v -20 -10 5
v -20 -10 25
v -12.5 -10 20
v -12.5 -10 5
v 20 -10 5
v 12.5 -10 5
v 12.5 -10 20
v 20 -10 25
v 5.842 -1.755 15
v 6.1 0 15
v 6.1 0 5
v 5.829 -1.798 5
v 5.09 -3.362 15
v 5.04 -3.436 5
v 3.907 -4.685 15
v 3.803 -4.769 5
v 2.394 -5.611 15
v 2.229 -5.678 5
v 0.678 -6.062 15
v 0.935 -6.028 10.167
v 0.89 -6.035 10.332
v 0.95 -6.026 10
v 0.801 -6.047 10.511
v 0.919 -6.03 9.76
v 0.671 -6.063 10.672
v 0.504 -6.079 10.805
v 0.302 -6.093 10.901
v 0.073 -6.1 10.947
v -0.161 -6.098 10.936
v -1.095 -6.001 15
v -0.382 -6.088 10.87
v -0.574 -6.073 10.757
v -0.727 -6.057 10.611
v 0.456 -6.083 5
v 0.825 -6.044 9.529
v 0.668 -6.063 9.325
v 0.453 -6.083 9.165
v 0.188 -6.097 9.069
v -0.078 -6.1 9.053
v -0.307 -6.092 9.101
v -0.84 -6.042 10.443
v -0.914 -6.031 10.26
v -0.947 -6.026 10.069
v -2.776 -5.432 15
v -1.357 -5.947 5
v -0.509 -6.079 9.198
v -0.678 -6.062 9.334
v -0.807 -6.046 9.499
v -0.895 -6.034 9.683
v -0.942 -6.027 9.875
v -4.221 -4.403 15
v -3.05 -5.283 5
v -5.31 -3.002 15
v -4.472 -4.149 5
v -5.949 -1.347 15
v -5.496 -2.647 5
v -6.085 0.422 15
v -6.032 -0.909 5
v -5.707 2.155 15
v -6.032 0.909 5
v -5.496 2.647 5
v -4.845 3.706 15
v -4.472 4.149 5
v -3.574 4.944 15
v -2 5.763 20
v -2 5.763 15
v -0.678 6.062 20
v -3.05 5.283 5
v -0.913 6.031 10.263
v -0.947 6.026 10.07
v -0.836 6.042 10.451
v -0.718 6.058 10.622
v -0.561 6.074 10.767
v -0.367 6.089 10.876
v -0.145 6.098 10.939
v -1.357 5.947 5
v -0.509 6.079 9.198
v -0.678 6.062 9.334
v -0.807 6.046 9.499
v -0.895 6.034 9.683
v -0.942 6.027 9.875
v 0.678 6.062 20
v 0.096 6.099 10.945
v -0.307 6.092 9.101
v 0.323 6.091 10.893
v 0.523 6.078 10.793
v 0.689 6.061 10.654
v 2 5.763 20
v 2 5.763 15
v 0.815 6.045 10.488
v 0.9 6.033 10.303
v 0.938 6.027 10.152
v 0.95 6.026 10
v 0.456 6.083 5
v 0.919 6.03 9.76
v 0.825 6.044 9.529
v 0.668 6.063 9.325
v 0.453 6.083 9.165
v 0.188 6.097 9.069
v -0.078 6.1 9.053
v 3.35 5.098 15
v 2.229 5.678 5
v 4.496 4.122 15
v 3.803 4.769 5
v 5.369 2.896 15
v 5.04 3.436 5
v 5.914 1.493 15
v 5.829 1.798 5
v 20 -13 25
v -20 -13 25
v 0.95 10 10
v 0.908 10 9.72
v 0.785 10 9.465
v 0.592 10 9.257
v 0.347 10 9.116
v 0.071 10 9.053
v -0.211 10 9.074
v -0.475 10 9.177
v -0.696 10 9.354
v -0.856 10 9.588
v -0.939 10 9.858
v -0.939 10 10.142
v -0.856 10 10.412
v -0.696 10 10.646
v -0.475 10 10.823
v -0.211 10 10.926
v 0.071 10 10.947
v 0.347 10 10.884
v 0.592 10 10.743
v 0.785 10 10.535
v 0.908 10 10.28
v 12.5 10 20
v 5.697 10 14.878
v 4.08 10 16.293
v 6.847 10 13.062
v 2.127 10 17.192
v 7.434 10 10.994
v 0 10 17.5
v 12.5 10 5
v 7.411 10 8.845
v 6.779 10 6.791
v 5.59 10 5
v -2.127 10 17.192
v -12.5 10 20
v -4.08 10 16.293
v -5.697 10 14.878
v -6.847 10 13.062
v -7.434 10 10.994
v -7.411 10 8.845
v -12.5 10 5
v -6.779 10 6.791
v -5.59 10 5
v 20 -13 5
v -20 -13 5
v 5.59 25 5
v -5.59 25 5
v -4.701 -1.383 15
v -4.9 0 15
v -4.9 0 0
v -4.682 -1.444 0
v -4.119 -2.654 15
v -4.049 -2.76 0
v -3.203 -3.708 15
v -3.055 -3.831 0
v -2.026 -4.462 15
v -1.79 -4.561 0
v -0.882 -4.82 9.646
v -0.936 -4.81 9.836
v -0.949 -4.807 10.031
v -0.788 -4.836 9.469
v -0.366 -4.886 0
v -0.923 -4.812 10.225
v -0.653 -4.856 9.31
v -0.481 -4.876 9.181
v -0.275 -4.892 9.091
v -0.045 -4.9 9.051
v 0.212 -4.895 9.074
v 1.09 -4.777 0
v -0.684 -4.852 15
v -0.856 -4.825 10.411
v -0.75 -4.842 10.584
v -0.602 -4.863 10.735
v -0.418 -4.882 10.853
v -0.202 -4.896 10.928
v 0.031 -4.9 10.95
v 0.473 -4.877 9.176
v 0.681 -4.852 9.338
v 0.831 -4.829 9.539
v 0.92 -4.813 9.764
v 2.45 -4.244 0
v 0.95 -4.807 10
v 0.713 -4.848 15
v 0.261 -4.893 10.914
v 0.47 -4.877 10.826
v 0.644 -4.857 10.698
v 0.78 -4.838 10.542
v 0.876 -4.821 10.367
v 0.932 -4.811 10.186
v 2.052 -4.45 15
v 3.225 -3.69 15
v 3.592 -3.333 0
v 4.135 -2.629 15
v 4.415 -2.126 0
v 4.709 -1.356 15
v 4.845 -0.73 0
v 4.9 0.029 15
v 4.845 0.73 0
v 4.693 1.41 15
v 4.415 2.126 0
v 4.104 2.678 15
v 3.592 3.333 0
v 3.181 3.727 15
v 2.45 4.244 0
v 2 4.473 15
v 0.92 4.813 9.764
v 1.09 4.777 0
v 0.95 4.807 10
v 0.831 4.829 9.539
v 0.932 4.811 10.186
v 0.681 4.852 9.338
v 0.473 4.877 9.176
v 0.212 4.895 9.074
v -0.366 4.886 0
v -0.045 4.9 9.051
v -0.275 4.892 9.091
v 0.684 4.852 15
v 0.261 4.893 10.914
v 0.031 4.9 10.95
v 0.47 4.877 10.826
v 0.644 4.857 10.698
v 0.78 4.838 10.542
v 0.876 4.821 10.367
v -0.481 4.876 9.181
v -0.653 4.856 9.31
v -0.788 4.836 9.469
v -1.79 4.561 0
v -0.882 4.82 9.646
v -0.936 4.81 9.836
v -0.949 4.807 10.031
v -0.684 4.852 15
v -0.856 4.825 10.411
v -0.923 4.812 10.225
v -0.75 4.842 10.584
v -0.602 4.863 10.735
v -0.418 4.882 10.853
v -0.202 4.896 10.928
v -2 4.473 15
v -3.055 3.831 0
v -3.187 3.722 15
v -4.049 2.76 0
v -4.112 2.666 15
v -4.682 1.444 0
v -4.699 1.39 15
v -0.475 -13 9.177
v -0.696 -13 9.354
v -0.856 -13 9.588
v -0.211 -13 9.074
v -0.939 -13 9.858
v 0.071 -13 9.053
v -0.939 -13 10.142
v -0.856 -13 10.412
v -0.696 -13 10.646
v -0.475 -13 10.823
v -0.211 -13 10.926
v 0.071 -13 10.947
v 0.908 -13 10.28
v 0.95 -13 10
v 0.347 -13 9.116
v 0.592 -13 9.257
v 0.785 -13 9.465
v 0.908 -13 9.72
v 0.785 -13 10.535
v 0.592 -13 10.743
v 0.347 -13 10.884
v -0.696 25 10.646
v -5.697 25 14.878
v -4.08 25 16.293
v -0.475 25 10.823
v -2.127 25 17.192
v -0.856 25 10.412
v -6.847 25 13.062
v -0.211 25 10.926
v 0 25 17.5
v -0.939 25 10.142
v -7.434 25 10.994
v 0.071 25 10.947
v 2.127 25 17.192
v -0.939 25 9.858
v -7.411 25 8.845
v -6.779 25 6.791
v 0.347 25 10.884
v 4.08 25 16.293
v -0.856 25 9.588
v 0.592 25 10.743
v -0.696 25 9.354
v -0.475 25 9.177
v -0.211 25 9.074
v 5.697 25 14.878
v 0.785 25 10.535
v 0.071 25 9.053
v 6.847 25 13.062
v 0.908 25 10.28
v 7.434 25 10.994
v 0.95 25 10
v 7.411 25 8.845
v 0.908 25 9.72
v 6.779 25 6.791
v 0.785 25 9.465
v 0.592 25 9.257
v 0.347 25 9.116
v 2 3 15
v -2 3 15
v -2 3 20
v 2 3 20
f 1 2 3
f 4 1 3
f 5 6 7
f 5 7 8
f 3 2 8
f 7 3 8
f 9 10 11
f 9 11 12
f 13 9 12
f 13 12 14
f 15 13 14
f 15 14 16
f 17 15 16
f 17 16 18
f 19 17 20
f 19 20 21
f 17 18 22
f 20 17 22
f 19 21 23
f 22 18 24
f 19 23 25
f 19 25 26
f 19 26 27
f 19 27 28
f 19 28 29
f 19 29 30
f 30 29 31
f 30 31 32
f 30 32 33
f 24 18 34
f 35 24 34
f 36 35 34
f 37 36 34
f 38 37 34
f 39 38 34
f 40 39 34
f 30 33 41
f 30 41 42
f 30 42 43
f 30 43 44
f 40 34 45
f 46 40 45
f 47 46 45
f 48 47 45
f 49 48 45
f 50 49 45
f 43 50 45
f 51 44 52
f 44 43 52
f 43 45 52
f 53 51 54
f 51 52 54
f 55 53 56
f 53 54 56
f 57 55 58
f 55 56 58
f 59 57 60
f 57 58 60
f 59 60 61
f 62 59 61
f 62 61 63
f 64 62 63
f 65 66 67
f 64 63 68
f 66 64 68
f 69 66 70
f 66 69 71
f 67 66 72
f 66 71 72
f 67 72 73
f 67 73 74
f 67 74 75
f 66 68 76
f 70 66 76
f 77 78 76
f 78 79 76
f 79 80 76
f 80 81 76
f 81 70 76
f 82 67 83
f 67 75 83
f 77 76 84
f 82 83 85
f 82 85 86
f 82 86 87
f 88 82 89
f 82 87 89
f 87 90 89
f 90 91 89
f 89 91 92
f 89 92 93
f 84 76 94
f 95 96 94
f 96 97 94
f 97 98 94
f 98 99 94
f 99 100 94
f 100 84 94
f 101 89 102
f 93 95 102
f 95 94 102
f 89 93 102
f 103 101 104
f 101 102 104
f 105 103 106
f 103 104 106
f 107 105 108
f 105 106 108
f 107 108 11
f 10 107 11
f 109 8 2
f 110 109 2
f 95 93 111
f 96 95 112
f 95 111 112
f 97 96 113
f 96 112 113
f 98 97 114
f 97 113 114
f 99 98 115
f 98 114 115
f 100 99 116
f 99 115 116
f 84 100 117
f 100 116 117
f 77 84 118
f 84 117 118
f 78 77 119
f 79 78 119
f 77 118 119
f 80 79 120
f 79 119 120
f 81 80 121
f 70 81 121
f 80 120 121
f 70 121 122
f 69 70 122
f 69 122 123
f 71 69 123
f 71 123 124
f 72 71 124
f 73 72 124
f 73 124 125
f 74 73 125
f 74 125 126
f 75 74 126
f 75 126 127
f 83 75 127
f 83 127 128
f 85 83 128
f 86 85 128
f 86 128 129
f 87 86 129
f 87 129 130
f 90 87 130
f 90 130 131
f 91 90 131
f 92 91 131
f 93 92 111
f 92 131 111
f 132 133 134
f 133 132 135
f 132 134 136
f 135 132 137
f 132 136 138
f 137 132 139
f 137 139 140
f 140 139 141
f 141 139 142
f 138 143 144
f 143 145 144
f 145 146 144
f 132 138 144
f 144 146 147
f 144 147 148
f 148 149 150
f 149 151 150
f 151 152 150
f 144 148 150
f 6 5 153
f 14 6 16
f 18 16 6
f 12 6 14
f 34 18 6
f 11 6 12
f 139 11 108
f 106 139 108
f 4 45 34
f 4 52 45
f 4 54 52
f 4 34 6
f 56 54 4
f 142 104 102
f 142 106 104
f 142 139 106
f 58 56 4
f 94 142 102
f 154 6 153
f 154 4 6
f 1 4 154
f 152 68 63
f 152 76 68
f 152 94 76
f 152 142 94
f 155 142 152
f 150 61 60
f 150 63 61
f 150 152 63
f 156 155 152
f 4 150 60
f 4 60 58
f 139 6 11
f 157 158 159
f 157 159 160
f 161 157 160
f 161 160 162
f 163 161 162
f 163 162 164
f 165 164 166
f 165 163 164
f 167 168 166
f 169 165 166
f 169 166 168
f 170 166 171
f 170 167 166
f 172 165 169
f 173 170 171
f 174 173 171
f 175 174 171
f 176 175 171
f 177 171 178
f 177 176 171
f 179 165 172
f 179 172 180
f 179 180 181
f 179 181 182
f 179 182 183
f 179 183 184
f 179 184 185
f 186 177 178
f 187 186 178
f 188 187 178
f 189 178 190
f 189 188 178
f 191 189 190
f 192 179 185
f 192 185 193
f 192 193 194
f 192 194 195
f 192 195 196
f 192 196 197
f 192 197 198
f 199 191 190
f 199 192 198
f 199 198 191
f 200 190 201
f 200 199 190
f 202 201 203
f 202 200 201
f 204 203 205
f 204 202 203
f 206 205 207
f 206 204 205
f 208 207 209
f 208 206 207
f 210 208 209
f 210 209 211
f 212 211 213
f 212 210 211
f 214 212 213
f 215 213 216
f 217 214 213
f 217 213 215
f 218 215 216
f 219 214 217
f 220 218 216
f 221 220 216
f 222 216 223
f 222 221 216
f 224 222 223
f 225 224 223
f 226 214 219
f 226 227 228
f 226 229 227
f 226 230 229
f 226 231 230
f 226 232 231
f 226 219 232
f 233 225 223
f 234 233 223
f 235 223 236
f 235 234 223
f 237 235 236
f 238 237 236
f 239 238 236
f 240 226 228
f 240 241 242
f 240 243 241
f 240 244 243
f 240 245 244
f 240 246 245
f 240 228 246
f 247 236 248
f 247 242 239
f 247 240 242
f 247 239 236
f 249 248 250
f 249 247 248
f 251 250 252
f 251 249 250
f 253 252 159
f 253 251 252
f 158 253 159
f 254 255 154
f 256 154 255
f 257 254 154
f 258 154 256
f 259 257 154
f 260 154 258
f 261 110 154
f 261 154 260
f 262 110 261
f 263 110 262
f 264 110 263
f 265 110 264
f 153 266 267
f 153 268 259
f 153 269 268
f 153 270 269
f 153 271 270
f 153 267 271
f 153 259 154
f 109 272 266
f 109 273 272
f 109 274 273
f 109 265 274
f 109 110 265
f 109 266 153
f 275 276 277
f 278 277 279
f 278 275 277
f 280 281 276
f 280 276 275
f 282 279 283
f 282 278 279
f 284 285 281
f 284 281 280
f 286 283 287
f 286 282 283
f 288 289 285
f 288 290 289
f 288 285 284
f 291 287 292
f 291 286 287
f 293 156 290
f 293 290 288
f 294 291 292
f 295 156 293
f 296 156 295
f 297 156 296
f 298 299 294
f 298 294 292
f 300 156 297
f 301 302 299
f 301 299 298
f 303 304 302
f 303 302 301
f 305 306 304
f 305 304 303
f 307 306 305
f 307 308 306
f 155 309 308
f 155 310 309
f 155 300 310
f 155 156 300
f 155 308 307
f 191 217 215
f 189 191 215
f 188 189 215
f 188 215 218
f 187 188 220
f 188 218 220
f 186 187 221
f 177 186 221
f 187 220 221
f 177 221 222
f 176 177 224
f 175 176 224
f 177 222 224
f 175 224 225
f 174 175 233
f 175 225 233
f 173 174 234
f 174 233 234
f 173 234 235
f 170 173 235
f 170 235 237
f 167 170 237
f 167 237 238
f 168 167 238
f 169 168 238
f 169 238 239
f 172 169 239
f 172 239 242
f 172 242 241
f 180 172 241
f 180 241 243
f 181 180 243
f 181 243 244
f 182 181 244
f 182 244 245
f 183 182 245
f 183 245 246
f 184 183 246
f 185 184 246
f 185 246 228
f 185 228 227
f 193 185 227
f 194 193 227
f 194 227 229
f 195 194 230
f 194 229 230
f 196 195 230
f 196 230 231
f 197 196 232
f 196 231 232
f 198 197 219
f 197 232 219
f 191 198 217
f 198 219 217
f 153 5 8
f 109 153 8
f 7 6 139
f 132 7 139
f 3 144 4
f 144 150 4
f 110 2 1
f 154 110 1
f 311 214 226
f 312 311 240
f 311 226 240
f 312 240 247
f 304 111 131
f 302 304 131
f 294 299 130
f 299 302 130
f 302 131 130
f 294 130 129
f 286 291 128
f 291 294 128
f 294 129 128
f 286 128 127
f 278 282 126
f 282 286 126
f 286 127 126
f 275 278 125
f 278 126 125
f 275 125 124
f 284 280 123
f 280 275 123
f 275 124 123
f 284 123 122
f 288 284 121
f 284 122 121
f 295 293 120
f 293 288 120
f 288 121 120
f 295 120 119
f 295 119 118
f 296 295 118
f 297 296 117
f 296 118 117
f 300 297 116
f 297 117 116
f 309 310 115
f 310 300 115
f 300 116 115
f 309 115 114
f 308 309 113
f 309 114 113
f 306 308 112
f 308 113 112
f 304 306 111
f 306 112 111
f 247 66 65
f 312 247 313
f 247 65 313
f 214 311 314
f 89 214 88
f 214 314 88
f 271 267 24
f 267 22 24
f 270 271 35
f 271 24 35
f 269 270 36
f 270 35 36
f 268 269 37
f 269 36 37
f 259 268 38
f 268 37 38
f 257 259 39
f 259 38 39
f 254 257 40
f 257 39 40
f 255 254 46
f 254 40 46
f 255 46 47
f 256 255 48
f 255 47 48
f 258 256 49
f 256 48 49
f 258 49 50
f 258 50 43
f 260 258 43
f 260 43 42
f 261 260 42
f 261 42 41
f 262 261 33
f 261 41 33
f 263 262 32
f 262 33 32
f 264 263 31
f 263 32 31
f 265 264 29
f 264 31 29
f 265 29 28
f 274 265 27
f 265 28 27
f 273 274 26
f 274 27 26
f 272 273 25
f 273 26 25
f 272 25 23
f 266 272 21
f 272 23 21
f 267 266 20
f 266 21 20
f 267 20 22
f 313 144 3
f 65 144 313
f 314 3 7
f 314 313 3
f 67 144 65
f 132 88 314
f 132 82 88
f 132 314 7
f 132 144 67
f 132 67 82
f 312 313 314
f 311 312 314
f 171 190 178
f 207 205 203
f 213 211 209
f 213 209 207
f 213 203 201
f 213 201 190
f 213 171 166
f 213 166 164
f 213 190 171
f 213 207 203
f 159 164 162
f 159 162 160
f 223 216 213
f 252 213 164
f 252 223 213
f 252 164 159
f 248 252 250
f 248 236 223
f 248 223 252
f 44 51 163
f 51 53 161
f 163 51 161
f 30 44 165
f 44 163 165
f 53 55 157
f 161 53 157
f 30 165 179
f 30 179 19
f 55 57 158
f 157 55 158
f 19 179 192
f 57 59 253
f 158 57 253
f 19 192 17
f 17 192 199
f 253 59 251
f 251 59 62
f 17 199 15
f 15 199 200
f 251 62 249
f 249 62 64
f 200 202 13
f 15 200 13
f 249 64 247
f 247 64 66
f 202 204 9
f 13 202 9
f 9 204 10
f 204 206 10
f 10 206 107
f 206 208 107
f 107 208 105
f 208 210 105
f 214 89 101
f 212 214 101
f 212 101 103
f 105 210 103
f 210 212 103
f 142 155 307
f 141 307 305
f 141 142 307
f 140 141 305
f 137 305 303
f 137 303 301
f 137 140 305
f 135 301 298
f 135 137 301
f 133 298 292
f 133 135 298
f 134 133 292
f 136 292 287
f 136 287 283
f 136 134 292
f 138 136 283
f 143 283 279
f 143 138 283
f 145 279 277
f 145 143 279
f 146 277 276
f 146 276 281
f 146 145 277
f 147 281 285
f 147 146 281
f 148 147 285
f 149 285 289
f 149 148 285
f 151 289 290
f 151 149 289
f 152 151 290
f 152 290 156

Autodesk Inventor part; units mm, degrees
ref_plane "YZ Plane" through (0, 0, 0) normal (1, 0, 0) x (0, 1, 0)
ref_plane "XZ Plane" through (0, 0, 0) normal (0, 1, 0) x (-1, 0, 0)
ref_plane "XY Plane" through (0, 0, 0) normal (0, 0, 1) x (1, 0, 0)
sketch "Sketch1" plane through (0, 0, 0) normal (0, 0, 1) x (1, 0, 0)
  circle A0 centre (0, 0) radius 6.1
  line L0 (-12.5, -10) -> (12.5, -10)
  line L1 (12.5, -10) -> (12.5, 10)
  line L2 (12.5, 10) -> (-12.5, 10)
  line L3 (-12.5, 10) -> (-12.5, -10)
  line L4 (-12.5, -10) -> (12.5, 10) construction
  line L5 (12.5, -10) -> (-12.5, 10) construction
  dimension "d0" = 12.2
  dimension "d1" = 25
  dimension "d2" = 20
extrude "Extrusion1" add sketch "Sketch1" along normal blind 20
sketch "Sketch2" plane through (-12.5, 10, 0) normal (0, 1, 0) x (1, 0, 0)
  line L0 (0, 0) -> (0, -20) construction
  line L1 (25, -20) -> (0, -20) construction
  line L2 (0, 0) -> (25, -20) construction
  line L3 (0, -20) -> (25, 0) construction
  circle A0 centre (12.5, -10) radius 0.95
  point P0 (12.5, 0)
  dimension "d5" = 1.9
extrude "Extrusion2" cut sketch "Sketch2" against normal blind 100
sketch "Sketch3" plane through (-12.5, 10, 0) normal (0, 1, 0) x (1, 0, 0)
  circle A0 centre (12.5, -10) radius 0.95 projected
  line L0 (25, 0) -> (0, 0) projected
  line L1 (0, 0) -> (0, -20) projected
  line L2 (25, -20) -> (0, -20) projected
  line L3 (25, 0) -> (25, -20) projected
  circle A1 centre (12.5, -10) radius 7.5
  point P0 (12.5, 0)
  dimension "d8" = 15
extrude "Extrusion3" add sketch "Sketch3" along normal blind 15 contours A1
sketch "Sketch4" plane through (-12.5, -10, 0) normal (0, -1, 0) x (1, 0, 0)
  line L0 (32.5, 25) -> (-7.5, 25)
  line L1 (-7.5, 25) -> (-7.5, -5)
  line L2 (-7.5, -5) -> (32.5, -5)
  line L3 (32.5, -5) -> (32.5, 25)
  circle A0 centre (12.5, 10) radius 0.95 projected
  line L4 (32.5, 25) -> (-7.5, -5) construction
  line L5 (-7.5, 25) -> (32.5, -5) construction
  point P0 (12.5, 0)
  dimension "d11" = 30
  dimension "d12" = 40
extrude "Extrusion4" add sketch "Sketch4" along normal blind 3
sketch "Sketch6" plane through (20, -10, -5) normal (0, 0, -1) x (-1, 0, 0)
  line L0 (-13.3468, 43.0165) -> (63.7046, 43.0165)
  line L1 (63.7046, 43.0165) -> (63.7046, -16.6019)
  line L2 (63.7046, -16.6019) -> (-13.3468, -16.6019)
  line L3 (-13.3468, -16.6019) -> (-13.3468, 43.0165)
  point P0 (20, 10)
extrude "Extrusion6" cut sketch "Sketch6" against normal blind 10
sketch "Sketch8" plane through (-12.5, 25, 0) normal (0, 1, 0) x (1, 0, 0)
  circle A0 centre (12.5, -10) radius 0.95 projected
  point P0 (12.5, 0)
extrude "Extrusion8" cut sketch "Sketch8" against normal blind 100
sketch "Sketch9" plane through (0, 0, 20) normal (0, 0, 1) x (1, 0, 0)
  line L0 (-2, 5.7628) -> (-2, 3)
  line L1 (-2, 3) -> (2, 3)
  line L2 (2, 3) -> (2, 5.7628)
  circle A0 centre (0, 0) radius 6.1 projected
  line L3 (12.5, -10) -> (12.5, 10) projected
  line L4 (12.5, 10) -> (-12.5, 10) projected
  line L5 (-12.5, 10) -> (-12.5, -10) projected
  line L6 (-12.5, -10) -> (12.5, -10) projected
  circle A1 centre (0, 0) radius 6.1 projected
  dimension "d28" = 2
  dimension "d29" = 2
  dimension "d30" = 3
extrude "Extrusion9" add sketch "Sketch9" against normal blind 5 contours L0 L1 L2 A0 picked at (0.2259, -0.0207)
sketch "Sketch10" plane through (0, 0, 15) normal (0, 0, -1) x (-1, 0, 0)
  circle A0 centre (0, 0) radius 4.9
  dimension "d33" = 9.8
extrude "Extrusion10" add sketch "Sketch10" along normal blind 15
sketch "Sketch11" plane through (-12.5, 25, 0) normal (0, 1, 0) x (1, 0, 0)
  circle A0 centre (12.5, -10) radius 0.95 projected
  point P0 (12.5, 0)
extrude "Extrusion11" cut sketch "Sketch11" against normal blind 100
properties part number "Feather_0_template"
